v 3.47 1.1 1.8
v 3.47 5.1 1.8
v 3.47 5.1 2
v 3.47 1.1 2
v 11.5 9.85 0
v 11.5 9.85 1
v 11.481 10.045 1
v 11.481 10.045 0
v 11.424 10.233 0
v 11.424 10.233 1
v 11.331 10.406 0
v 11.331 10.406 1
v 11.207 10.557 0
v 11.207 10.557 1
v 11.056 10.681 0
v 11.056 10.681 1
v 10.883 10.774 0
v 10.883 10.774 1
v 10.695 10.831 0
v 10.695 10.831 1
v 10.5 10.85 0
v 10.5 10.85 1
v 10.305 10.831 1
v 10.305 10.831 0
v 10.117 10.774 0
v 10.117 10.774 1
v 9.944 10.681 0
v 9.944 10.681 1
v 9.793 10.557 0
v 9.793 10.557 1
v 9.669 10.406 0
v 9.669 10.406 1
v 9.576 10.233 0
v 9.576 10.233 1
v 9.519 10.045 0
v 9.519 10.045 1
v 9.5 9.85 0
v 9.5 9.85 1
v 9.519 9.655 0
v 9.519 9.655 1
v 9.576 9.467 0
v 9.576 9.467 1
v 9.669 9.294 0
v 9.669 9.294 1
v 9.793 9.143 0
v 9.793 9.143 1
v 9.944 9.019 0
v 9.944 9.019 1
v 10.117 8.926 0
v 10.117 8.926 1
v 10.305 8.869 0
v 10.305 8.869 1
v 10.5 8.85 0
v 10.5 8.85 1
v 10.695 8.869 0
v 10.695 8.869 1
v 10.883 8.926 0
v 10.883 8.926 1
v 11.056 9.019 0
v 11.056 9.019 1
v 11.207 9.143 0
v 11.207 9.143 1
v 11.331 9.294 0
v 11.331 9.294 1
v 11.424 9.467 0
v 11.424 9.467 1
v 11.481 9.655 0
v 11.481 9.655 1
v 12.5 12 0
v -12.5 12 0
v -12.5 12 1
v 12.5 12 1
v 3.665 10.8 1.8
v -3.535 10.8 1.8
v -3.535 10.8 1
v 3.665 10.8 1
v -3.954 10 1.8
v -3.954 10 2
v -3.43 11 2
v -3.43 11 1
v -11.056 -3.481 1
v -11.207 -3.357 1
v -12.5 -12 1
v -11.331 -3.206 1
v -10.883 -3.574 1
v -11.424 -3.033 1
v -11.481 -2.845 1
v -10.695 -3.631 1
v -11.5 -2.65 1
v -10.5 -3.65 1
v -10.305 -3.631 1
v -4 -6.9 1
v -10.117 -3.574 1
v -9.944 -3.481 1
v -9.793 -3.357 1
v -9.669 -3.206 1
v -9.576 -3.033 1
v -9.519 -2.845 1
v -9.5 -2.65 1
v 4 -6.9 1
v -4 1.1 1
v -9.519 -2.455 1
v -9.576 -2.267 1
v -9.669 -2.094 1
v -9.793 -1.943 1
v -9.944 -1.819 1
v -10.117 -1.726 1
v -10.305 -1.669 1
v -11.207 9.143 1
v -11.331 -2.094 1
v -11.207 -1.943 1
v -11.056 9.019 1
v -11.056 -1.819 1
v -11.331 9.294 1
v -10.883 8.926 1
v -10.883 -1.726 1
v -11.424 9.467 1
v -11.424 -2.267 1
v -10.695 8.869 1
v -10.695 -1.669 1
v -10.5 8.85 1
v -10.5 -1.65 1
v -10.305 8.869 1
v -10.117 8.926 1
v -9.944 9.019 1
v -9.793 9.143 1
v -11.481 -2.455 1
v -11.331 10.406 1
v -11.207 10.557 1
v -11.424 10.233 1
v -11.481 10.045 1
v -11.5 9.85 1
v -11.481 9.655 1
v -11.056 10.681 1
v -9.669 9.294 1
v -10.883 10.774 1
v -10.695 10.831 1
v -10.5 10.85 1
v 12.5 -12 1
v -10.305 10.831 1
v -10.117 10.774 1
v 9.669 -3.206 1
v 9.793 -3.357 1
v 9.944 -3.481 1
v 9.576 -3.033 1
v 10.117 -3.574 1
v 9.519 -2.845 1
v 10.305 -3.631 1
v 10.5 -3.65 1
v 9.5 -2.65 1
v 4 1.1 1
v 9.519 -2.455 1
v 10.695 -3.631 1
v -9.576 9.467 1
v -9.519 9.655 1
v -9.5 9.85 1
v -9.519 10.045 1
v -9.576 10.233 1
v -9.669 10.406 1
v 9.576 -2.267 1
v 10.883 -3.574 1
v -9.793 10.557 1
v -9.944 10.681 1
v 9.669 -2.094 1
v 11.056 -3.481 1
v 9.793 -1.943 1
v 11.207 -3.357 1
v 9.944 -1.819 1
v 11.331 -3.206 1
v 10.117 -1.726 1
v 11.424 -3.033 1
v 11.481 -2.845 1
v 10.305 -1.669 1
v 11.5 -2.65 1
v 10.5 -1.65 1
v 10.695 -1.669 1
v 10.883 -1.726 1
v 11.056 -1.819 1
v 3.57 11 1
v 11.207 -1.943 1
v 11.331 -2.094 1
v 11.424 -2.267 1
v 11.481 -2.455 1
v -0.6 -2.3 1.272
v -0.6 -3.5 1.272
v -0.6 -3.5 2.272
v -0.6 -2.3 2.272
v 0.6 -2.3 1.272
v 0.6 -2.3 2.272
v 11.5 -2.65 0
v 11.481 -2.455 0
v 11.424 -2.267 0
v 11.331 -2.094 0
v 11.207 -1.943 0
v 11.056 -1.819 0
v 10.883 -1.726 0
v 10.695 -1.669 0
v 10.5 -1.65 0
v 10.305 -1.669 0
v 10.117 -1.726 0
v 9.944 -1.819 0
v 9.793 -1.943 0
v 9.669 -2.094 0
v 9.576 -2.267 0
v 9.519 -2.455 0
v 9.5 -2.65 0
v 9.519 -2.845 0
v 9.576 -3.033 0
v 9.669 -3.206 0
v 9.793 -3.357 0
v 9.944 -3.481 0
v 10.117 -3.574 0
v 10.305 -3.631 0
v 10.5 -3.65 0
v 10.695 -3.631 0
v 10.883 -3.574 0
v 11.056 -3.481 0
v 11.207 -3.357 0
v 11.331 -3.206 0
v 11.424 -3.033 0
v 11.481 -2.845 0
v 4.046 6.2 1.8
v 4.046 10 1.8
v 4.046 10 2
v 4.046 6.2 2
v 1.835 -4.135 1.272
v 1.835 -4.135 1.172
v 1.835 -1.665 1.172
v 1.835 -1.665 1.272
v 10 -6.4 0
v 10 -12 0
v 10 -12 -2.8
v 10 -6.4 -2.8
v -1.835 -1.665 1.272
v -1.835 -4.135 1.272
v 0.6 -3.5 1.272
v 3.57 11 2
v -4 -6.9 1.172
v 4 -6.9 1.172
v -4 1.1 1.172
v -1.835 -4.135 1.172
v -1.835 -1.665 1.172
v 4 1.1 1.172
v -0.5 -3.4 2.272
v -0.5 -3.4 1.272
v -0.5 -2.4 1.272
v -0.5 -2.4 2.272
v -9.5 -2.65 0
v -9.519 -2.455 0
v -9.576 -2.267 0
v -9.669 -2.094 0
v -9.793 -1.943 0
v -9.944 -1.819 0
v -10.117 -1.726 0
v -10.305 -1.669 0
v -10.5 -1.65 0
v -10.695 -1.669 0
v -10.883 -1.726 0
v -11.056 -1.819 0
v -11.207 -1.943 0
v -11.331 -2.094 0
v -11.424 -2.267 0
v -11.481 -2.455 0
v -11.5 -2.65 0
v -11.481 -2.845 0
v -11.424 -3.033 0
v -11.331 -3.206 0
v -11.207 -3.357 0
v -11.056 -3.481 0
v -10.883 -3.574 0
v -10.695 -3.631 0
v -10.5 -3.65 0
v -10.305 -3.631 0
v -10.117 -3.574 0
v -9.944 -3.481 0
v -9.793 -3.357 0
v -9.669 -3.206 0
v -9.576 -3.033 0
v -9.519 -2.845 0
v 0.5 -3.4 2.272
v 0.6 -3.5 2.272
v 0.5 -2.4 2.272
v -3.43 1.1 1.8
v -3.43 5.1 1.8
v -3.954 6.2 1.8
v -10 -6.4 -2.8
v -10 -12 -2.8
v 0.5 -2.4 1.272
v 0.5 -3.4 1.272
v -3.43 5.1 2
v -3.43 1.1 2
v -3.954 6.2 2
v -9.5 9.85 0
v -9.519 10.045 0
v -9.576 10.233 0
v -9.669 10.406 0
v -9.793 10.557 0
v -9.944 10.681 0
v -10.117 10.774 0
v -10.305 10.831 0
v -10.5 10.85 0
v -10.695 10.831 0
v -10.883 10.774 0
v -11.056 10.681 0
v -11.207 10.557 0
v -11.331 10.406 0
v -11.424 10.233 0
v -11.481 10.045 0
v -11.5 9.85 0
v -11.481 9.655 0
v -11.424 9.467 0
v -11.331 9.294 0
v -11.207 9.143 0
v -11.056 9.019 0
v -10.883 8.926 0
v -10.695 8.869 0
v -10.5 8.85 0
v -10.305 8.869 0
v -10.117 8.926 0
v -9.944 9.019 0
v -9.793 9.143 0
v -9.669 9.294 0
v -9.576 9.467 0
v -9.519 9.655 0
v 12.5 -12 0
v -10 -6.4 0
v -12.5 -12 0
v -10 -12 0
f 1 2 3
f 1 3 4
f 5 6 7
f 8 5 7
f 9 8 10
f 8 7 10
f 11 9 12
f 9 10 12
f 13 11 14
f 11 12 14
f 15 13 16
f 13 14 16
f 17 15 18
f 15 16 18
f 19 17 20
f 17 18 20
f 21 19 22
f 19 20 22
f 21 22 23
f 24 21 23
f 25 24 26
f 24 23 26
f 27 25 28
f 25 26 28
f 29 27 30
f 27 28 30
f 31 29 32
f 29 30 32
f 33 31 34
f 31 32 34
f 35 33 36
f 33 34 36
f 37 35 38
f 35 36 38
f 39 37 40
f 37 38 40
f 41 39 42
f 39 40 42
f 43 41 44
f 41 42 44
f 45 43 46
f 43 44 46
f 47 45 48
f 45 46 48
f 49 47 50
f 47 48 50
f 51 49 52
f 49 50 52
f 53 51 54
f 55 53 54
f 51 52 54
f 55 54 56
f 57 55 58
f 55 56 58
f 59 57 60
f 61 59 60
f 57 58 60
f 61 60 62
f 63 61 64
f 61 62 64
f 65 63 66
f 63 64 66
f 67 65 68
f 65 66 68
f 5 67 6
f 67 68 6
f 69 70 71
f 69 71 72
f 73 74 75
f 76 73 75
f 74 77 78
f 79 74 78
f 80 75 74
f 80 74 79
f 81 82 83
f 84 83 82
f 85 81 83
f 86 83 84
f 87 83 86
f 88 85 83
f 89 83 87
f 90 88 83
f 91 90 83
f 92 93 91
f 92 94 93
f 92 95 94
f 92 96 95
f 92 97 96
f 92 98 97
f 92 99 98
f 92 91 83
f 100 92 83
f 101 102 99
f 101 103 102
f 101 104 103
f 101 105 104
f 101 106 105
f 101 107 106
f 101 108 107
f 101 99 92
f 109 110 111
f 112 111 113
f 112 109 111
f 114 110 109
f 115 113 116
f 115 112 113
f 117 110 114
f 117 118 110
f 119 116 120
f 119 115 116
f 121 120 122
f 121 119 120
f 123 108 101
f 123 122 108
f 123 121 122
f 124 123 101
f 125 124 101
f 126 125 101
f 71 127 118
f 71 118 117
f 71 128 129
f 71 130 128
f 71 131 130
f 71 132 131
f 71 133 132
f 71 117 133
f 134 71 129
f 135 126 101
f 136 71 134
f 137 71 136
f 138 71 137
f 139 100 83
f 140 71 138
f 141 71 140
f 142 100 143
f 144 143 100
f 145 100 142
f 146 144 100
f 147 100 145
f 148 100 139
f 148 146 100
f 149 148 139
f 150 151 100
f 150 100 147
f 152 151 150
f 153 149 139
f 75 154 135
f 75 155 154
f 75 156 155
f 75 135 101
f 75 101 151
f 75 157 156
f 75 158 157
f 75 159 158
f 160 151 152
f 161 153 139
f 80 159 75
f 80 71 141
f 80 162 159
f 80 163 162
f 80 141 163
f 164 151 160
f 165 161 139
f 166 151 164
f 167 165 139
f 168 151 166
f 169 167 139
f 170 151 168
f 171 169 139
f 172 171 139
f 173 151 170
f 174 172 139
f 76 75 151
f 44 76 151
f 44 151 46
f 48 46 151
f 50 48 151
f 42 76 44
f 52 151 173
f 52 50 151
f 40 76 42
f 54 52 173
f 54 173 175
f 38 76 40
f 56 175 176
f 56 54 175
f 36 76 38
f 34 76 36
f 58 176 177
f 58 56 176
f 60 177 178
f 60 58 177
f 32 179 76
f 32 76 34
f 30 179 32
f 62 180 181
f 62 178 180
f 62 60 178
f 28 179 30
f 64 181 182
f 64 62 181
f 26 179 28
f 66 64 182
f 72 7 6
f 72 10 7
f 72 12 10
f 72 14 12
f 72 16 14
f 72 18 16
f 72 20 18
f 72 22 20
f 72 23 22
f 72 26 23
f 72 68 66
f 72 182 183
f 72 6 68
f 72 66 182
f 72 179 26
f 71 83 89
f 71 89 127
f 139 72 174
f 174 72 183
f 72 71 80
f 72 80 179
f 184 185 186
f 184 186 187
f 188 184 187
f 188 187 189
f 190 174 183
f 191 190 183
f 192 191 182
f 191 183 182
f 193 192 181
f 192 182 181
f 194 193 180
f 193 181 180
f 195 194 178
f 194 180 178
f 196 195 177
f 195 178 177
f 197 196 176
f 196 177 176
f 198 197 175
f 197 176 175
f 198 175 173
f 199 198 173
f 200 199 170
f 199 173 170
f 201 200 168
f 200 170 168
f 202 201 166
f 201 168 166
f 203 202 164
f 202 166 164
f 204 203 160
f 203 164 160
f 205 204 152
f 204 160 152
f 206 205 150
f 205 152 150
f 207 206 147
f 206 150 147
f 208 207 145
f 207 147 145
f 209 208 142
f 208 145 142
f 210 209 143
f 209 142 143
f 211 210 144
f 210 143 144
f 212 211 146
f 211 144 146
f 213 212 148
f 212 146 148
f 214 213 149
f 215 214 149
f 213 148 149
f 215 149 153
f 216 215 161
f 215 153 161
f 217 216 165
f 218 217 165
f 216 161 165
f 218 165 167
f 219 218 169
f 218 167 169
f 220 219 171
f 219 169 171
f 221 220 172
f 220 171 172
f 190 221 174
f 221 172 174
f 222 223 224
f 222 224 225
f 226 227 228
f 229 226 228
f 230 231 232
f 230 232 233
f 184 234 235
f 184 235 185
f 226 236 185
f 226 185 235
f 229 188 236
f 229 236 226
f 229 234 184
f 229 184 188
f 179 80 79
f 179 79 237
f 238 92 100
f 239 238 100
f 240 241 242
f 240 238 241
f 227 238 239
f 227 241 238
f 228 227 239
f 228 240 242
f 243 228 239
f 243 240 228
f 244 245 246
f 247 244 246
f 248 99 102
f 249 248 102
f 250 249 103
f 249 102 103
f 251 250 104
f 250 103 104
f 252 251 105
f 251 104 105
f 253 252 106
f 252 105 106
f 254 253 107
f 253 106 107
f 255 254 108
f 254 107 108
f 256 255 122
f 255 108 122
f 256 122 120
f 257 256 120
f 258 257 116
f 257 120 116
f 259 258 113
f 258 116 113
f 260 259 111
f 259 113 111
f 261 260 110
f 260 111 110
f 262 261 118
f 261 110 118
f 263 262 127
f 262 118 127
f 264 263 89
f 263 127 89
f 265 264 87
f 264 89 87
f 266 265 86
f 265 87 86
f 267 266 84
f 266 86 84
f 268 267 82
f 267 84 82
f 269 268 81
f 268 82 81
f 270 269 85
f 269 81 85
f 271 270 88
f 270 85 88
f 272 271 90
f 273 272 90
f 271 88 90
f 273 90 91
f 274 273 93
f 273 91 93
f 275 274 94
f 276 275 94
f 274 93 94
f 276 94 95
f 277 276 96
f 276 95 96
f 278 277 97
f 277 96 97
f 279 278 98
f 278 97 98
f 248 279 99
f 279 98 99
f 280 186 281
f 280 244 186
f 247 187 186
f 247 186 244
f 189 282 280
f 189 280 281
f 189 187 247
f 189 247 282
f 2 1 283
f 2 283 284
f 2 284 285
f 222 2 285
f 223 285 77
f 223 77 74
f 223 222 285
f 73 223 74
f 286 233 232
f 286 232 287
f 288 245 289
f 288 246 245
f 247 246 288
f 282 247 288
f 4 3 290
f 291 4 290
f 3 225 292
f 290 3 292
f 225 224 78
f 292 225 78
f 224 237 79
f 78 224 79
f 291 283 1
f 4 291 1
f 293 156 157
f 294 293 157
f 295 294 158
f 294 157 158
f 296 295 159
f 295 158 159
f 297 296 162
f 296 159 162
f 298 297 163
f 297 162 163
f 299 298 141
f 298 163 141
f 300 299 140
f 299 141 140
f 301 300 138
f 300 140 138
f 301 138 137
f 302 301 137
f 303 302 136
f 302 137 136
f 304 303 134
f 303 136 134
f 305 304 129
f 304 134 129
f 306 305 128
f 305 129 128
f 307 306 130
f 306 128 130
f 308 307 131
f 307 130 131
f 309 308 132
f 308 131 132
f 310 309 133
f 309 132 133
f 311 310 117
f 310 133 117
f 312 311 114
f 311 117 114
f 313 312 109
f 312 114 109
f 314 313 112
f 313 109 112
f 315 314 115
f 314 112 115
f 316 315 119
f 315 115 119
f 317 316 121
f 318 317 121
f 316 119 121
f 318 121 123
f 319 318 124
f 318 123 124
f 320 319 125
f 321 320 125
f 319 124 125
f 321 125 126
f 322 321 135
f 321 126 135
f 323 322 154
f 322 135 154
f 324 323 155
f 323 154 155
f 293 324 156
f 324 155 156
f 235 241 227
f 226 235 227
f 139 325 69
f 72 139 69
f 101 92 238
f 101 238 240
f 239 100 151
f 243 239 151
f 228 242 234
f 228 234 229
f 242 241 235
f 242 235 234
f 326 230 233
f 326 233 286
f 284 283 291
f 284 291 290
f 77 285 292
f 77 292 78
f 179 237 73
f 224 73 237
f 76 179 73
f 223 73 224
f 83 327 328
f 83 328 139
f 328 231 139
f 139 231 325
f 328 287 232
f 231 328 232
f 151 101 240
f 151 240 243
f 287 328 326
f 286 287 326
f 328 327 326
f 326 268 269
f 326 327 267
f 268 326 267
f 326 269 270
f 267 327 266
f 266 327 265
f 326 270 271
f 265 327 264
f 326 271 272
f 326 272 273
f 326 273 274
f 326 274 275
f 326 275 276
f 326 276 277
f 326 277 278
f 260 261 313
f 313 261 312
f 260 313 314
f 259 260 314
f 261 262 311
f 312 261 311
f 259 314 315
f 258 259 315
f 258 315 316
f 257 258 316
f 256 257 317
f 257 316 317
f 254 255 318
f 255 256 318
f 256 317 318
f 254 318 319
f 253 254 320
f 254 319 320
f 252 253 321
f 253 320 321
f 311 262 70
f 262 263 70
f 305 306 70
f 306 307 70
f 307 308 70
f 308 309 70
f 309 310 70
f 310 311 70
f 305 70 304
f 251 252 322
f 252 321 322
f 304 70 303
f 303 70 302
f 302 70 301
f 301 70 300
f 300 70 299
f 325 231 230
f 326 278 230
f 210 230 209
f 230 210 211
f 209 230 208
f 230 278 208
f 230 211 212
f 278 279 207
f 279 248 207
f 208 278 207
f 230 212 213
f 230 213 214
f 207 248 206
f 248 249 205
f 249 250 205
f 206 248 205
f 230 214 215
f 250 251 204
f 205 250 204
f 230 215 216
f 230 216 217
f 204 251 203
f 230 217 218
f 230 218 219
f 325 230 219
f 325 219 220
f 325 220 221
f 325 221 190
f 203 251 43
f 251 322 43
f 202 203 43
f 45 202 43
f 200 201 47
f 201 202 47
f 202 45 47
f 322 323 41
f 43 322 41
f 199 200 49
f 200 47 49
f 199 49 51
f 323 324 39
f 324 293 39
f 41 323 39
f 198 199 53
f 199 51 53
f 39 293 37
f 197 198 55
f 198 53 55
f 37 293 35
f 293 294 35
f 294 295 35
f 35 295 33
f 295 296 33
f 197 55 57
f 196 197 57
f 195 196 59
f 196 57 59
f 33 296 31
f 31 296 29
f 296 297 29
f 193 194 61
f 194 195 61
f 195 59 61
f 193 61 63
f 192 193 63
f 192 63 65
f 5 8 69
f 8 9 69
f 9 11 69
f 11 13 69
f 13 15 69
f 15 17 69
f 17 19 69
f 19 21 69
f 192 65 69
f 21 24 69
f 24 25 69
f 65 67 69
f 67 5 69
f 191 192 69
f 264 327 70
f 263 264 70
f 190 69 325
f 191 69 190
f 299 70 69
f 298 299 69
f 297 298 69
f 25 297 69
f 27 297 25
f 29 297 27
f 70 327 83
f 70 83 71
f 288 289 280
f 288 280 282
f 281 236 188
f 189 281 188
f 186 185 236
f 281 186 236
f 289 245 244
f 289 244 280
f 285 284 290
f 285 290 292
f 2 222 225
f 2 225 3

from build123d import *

# Parameters (mm, degrees)
SKETCH1_W                 = 25
SKETCH1_H                 = 24
BOSS_EXTRUDE1_DEPTH       = 1
SKETCH2_R                 = 1
CUT_EXTRUDE1_DEPTH        = 1
SKETCH3_W                 = 8
SKETCH3_H                 = 8
BOSS_EXTRUDE2_DEPTH       = 5.2
SKETCH4_W                 = 8
SKETCH4_H                 = 8
SKETCH4_R                 = 3.75
CUT_EXTRUDE2_DEPTH        = 3.2
SKETCH5_R                 = 3.75
SKETCH5_R_2               = 3
CUT_EXTRUDE3_DEPTH        = 1.2
TOP_RIBBON_DEPTH          = 1
SKETCH7_W                 = 0.8
SKETCH7_H                 = 9.7
CUT_EXTRUDE4_DEPTH        = 9
SKETCH8_W                 = 20
SKETCH8_H                 = 5.6
REAR_RIBBON_DEPTH         = 2.8
CUT_EXTRUDE5_DEPTH        = 10
CUT_EXTRUDE5_DEPTH_BACK   = 1.827942302
SKETCH9_W                 = 8
SKETCH9_H                 = 8
SKETCH10_W                = 3.67
SKETCH10_H                = 2.47
CCD_DEPTH                 = 0.1
SKETCH11_W                = 1.2
SKETCH11_H                = 1.2
SKETCH11_W_2              = 1
SKETCH11_H_2              = 1
TELESCOPE_ALIGNMENT_DEPTH = 1.1


with BuildPart() as part:
    # Sketch1 → Boss-Extrude1 (new body)
    with BuildSketch(Plane.XY):
        Rectangle(SKETCH1_W, SKETCH1_H)
    extrude(amount=BOSS_EXTRUDE1_DEPTH)

    # Sketch2 → Cut-Extrude1 (cut)
    with BuildSketch(Plane.XY.offset(1)):
        with Locations((-10.5, 9.85)):
            Circle(SKETCH2_R)
        with Locations((10.5, 9.85)):
            Circle(SKETCH2_R)
        with Locations((10.5, -2.65)):
            Circle(SKETCH2_R)
        with Locations((-10.5, -2.65)):
            Circle(SKETCH2_R)
    extrude(amount=-CUT_EXTRUDE1_DEPTH, mode=Mode.SUBTRACT)

    # Sketch3 → Boss-Extrude2 (add)
    with BuildSketch(Plane.XY.offset(1)):
        with Locations((0, -2.9)):
            Rectangle(SKETCH3_W, SKETCH3_H)
    extrude(amount=BOSS_EXTRUDE2_DEPTH)

    # Sketch4 → Cut-Extrude2 (cut)
    with BuildSketch(Plane.XY.offset(6.2)):
        with Locations((0, -2.9)):
            Rectangle(SKETCH4_W, SKETCH4_H)
        with Locations((0, -2.9)):
            Circle(SKETCH4_R, mode=Mode.SUBTRACT)
    extrude(amount=-CUT_EXTRUDE2_DEPTH, mode=Mode.SUBTRACT)

    # Sketch5 → Cut-Extrude3 (cut)
    with BuildSketch(Plane.XY.offset(6.2)):
        with Locations((0, -2.9)):
            Circle(SKETCH5_R)
        with Locations((0, -2.9)):
            Circle(SKETCH5_R_2, mode=Mode.SUBTRACT)
    extrude(amount=-CUT_EXTRUDE3_DEPTH, mode=Mode.SUBTRACT)

    # Sketch6 → Top Ribbon (add)
    with BuildSketch(Plane.XY.offset(1)):
        Polygon((-3.430481742, 1.1), (-3.430481742, 5.1), (-3.954291266, 6.2), (-3.954291266, 10), (-3.430481742, 11), (3.569518258, 11), (4.045708734, 10), (4.045708734, 6.2), (3.469518258, 5.1), (3.469518258, 1.1), align=None)
    extrude(amount=TOP_RIBBON_DEPTH)

    # Sketch7 → Cut-Extrude4 (cut)
    with BuildSketch(Plane(origin=(4.045708734, 0, 0), x_dir=(0, 0, -1), z_dir=(1, 0, 0))):
        with Locations((-1.4, 5.95)):
            Rectangle(SKETCH7_W, SKETCH7_H)
    extrude(amount=-CUT_EXTRUDE4_DEPTH, mode=Mode.SUBTRACT)

    # Sketch8 → Rear Ribbon (add)
    with BuildSketch(Plane(origin=(0, 0, 0), x_dir=(-1, 0, 0), z_dir=(0, 0, -1))):
        with Locations((0, -9.2)):
            Rectangle(SKETCH8_W, SKETCH8_H)
    extrude(amount=REAR_RIBBON_DEPTH)

    # Sketch9 → Cut-Extrude5 (cut, two sides: drawn at the far end of the back side and taken through both)
    with BuildSketch(Plane.XY.offset(3).offset(-CUT_EXTRUDE5_DEPTH_BACK)):
        with Locations((0, -2.9)):
            Rectangle(SKETCH9_W, SKETCH9_H)
    extrude(amount=CUT_EXTRUDE5_DEPTH + CUT_EXTRUDE5_DEPTH_BACK, mode=Mode.SUBTRACT)

    # Sketch10 → CCD (add)
    with BuildSketch(Plane.XY.offset(1.172057698)):
        with Locations((0, -2.9)):
            Rectangle(SKETCH10_W, SKETCH10_H)
    extrude(amount=CCD_DEPTH)

    # Sketch11 → Telescope Alignment (add)
    with BuildSketch(Plane.XY.offset(1.172057698)):
        with Locations((0, -2.9)):
            Rectangle(SKETCH11_W, SKETCH11_H)
        with Locations((0, -2.9)):
            Rectangle(SKETCH11_W_2, SKETCH11_H_2, mode=Mode.SUBTRACT)
    extrude(amount=TELESCOPE_ALIGNMENT_DEPTH)


solid = part.part
